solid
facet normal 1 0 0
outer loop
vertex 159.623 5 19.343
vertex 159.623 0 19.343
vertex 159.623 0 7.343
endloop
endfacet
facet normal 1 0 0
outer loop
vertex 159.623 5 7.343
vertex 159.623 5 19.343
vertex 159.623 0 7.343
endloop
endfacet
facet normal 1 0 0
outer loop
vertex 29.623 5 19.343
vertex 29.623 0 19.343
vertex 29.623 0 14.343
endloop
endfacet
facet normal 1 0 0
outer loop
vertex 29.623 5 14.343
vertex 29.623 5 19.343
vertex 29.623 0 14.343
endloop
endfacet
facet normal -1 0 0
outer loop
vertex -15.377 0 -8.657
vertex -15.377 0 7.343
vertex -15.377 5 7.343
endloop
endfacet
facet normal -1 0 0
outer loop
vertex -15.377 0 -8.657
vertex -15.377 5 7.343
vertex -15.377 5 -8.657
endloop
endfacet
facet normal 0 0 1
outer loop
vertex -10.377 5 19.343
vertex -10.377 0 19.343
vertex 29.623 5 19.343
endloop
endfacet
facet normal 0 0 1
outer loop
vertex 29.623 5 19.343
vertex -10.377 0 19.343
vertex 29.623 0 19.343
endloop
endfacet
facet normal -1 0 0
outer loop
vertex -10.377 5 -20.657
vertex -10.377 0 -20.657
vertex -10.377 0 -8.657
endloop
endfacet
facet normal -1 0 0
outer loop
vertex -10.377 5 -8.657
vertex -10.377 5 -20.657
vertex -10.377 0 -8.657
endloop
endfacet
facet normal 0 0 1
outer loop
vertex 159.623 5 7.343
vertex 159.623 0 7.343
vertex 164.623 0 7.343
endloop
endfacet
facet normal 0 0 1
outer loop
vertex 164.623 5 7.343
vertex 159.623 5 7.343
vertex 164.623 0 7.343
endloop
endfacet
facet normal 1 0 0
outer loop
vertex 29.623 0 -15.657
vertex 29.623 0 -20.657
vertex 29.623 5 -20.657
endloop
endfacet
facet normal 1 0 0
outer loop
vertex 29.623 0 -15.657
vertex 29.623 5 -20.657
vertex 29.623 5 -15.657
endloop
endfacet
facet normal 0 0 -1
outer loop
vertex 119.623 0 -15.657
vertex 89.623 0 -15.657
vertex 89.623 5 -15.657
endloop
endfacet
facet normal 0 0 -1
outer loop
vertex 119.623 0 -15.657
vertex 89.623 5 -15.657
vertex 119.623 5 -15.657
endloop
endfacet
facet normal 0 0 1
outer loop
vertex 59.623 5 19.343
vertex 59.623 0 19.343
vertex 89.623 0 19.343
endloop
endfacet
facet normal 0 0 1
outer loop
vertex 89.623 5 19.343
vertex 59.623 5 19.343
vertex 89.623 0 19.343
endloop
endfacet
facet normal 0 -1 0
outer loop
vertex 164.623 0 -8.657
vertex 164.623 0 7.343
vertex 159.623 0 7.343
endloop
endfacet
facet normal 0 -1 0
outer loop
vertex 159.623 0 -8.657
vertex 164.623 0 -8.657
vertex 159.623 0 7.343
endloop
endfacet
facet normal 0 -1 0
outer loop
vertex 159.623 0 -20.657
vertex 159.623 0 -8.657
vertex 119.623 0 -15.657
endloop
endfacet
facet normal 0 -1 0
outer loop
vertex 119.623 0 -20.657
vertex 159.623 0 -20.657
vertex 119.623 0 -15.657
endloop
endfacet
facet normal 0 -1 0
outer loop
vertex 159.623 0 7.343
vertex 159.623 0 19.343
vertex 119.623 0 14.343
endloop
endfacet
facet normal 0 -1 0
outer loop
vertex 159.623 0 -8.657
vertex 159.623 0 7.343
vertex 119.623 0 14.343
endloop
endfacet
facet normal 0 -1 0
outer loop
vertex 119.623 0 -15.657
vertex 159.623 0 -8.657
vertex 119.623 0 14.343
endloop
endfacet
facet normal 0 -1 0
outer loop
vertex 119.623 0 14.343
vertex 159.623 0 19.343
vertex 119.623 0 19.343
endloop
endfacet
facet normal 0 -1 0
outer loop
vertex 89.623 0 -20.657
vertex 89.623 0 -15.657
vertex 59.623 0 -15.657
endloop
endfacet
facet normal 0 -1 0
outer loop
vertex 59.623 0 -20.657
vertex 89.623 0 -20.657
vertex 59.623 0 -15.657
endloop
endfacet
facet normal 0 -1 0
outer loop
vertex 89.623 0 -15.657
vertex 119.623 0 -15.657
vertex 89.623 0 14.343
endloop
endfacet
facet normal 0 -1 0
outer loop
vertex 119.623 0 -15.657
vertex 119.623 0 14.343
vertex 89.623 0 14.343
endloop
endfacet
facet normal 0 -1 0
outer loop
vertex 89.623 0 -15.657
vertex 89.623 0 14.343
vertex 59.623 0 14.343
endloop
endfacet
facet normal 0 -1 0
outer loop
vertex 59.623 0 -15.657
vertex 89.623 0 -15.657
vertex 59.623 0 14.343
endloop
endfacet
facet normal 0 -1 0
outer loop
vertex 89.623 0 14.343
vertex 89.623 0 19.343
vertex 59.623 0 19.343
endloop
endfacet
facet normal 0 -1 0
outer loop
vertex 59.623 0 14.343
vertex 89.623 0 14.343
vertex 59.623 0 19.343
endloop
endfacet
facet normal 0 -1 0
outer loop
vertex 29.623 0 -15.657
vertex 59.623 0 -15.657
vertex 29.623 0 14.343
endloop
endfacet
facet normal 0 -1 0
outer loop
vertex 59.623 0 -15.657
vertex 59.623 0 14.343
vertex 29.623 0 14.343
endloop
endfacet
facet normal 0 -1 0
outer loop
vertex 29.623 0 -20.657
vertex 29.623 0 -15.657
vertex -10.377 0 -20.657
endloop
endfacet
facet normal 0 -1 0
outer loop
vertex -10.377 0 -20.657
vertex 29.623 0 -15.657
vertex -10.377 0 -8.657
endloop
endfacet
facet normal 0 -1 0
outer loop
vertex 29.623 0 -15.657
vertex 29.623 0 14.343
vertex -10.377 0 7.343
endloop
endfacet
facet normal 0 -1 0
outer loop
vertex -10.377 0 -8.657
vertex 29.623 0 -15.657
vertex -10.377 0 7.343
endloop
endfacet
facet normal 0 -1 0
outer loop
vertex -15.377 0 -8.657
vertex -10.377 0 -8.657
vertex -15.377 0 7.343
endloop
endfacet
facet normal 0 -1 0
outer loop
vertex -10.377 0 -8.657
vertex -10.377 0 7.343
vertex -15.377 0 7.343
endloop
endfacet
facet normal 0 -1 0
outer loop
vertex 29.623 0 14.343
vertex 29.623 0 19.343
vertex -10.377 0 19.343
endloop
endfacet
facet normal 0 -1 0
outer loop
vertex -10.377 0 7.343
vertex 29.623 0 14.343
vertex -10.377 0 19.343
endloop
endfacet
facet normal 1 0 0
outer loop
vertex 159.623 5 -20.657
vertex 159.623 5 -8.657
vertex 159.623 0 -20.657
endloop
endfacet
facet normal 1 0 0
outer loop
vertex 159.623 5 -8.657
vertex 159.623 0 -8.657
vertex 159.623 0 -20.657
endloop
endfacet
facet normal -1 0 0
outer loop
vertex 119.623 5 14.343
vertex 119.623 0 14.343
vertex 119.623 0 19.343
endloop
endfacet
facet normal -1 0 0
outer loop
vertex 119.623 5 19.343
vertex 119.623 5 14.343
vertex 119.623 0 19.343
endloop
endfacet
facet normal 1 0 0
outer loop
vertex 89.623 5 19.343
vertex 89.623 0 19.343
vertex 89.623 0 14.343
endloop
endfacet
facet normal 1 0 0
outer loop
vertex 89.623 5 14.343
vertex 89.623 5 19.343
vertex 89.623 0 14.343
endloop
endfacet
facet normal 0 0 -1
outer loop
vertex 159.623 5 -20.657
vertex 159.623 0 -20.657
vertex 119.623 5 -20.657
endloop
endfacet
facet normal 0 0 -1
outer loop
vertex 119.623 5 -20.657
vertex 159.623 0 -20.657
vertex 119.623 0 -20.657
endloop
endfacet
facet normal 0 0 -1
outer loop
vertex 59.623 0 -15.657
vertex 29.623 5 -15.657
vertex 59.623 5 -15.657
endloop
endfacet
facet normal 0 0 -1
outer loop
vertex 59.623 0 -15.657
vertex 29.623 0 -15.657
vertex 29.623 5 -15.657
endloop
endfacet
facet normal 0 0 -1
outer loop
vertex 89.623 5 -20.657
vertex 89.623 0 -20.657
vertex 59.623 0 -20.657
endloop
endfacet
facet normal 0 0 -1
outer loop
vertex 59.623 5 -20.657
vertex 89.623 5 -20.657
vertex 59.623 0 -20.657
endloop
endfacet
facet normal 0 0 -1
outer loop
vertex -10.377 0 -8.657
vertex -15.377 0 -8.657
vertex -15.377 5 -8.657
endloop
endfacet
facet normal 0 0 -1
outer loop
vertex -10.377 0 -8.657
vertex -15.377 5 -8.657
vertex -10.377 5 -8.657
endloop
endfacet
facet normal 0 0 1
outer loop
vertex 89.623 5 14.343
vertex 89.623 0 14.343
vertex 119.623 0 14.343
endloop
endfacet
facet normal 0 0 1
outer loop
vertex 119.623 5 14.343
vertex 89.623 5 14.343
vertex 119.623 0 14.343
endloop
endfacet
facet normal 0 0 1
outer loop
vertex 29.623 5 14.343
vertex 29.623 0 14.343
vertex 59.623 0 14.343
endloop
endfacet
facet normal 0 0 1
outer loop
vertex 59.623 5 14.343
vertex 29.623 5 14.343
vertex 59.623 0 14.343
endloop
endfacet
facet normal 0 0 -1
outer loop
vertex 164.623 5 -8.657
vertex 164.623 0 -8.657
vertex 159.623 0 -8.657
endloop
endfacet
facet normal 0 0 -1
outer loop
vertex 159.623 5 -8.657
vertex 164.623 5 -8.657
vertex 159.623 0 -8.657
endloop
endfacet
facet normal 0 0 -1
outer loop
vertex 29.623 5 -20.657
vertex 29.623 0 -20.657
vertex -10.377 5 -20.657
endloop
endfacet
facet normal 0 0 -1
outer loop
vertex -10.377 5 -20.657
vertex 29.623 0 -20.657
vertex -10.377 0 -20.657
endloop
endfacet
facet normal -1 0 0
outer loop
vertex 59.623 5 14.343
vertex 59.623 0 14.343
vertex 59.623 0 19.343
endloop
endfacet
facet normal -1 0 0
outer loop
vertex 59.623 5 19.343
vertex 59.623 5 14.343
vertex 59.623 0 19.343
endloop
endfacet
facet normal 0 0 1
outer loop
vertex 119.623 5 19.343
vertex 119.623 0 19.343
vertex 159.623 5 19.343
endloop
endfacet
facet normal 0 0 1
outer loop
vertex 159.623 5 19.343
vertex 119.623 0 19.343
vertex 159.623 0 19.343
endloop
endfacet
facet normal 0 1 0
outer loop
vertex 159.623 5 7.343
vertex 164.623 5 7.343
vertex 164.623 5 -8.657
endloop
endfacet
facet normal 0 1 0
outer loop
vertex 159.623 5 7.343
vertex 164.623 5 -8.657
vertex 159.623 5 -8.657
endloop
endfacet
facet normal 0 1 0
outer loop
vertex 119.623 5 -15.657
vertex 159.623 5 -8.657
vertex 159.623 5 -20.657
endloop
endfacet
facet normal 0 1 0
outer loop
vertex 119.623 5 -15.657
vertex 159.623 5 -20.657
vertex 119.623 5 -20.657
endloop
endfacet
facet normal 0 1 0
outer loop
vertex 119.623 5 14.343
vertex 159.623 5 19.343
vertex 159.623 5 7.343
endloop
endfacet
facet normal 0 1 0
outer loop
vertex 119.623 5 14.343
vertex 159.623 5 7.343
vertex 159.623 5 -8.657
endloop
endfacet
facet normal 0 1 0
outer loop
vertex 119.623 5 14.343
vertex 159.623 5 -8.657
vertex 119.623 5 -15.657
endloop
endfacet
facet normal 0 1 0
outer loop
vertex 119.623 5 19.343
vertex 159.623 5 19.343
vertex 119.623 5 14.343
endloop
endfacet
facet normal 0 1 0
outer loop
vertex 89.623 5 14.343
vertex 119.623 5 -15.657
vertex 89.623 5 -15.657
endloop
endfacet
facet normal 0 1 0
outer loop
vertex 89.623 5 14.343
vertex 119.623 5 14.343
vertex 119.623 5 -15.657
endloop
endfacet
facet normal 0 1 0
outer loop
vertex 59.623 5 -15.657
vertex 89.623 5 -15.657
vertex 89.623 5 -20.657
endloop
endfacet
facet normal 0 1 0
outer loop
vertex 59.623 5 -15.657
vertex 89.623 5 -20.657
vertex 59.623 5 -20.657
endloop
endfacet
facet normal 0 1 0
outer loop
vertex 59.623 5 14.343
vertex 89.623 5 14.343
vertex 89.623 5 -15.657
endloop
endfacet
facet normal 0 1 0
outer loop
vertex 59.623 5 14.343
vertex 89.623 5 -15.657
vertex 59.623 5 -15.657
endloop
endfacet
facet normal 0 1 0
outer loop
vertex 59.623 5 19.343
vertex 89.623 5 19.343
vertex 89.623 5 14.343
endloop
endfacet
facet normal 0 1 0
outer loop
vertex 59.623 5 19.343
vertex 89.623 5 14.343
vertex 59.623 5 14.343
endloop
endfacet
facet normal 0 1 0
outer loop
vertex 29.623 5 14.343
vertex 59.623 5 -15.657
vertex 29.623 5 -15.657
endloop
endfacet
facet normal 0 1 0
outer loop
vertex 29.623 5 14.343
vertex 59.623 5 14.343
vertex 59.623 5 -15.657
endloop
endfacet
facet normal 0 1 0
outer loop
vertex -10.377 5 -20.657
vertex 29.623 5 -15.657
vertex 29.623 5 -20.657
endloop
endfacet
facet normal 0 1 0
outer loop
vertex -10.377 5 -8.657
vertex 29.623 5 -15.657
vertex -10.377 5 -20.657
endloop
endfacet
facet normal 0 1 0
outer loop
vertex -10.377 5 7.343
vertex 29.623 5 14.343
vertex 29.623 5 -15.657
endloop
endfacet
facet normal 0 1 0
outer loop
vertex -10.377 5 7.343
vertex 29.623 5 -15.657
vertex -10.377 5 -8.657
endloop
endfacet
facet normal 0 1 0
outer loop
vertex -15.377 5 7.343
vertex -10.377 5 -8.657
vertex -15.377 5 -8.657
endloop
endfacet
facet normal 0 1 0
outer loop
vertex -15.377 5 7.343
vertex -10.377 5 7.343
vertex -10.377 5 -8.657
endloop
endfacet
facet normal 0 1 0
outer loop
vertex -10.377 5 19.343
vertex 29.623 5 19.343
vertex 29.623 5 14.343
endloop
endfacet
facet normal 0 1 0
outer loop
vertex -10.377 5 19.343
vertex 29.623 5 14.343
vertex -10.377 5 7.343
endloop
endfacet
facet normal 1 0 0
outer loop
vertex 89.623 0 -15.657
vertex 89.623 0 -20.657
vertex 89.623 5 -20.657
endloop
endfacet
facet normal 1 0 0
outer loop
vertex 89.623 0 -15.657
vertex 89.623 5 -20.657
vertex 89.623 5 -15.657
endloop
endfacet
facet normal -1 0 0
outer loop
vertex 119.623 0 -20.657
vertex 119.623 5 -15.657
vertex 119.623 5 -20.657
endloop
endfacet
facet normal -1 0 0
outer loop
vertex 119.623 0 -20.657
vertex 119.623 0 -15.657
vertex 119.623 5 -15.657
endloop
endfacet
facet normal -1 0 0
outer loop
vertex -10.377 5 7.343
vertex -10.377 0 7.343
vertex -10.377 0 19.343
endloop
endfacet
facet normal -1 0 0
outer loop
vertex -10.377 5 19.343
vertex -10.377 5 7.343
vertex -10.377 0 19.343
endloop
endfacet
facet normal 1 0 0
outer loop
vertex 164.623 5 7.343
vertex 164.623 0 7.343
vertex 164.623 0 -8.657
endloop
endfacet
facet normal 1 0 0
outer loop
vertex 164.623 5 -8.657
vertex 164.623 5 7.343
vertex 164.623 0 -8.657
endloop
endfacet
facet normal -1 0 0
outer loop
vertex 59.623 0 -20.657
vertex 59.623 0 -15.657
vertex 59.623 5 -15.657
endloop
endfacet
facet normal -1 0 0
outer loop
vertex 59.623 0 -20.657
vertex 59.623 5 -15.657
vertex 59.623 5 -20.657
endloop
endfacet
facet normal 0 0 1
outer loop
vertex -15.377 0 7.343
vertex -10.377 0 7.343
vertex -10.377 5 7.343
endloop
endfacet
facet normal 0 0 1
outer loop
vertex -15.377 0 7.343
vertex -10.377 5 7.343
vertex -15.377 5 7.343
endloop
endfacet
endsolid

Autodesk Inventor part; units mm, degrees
ref_plane "YZ Plane" through (0, 0, 0) normal (1, 0, 0) x (0, 1, 0)
ref_plane "XZ Plane" through (0, 0, 0) normal (0, 1, 0) x (-1, 0, 0)
ref_plane "XY Plane" through (0, 0, 0) normal (0, 0, 1) x (1, 0, 0)
sketch "Sketch1" plane through (0, 0, 0) normal (0, 1, 0) x (-1, 0, 0)
  line L0 (10.3774, 19.343) -> (-159.6226, 19.343)
  line L1 (-159.6226, 19.343) -> (-159.6226, -20.657)
  line L2 (-159.6226, -20.657) -> (10.3774, -20.657)
  line L3 (10.3774, -20.657) -> (10.3774, 19.343)
  line L4 (10.3774, 7.343) -> (15.3774, 7.343)
  line L5 (15.3774, 7.343) -> (15.3774, -8.657)
  line L6 (15.3774, -8.657) -> (10.3774, -8.657)
  line L7 (10.3774, -8.657) -> (10.3774, 7.343)
  line L8 (-159.6226, 7.343) -> (-164.6226, 7.343)
  line L9 (-164.6226, 7.343) -> (-164.6226, -8.657)
  line L10 (-164.6226, -8.657) -> (-159.6226, -8.657)
  line L11 (-159.6226, -8.657) -> (-159.6226, 7.343)
  line L12 (-119.6226, -20.657) -> (-89.6226, -20.657)
  line L13 (-89.6226, -20.657) -> (-89.6226, -15.657)
  line L14 (-89.6226, -15.657) -> (-119.6226, -15.657)
  line L15 (-119.6226, -15.657) -> (-119.6226, -20.657)
  line L16 (-59.6226, -20.657) -> (-29.6226, -20.657)
  line L17 (-29.6226, -20.657) -> (-29.6226, -15.657)
  line L18 (-29.6226, -15.657) -> (-59.6226, -15.657)
  line L19 (-59.6226, -15.657) -> (-59.6226, -20.657)
  line L20 (-159.6226, -0.657) -> (10.3774, -0.657) construction
  line L21 (-74.6226, 19.343) -> (-74.6226, -20.657) construction
  line L22 (-89.6226, 19.343) -> (-89.6226, 14.343)
  line L23 (-89.6226, 14.343) -> (-119.6226, 14.343)
  line L24 (-119.6226, 14.343) -> (-119.6226, 19.343)
  line L25 (-29.6226, 19.343) -> (-29.6226, 14.343)
  line L26 (-29.6226, 14.343) -> (-59.6226, 14.343)
  line L27 (-59.6226, 14.343) -> (-59.6226, 19.343)
  line L28 (-74.6226, -20.657) -> (-74.6226, 19.343) construction
  point P0 (0, 0)
  point P1 (10.3774, -8.657)
  point P2 (-159.6226, -8.657)
  point P3 (-89.6226, -20.657)
  point P4 (-29.6226, -20.657)
  point P5 (-29.6226, 19.343)
  point P6 (-59.6226, 19.343)
  point P7 (-89.6226, 19.343)
  point P8 (-119.6226, 19.343)
  dimension "d0" = 170
  dimension "d1" = 40
  dimension "d2" = 5
  dimension "d3" = 16
  dimension "d4" = 12
  dimension "d5" = 5
  dimension "d6" = 16
  dimension "d7" = 12
  dimension "d17" = 30
  dimension "d18" = 5
  dimension "d19" = 30
  dimension "d20" = 30
  dimension "d21" = 15
extrude "Extrusion1" add sketch "Sketch1" along normal blind 5 contours L3 L2 L17 L18 L19 L13 L14 L15 L1 L0 L24 L23 L22 L27 L26 L25 | L4 L5 L6 L3 | L1 L10 L9 L8
equation "\"d3\" = d6"
equation "\"d7\" = d4"
properties part number "Superior 1"
